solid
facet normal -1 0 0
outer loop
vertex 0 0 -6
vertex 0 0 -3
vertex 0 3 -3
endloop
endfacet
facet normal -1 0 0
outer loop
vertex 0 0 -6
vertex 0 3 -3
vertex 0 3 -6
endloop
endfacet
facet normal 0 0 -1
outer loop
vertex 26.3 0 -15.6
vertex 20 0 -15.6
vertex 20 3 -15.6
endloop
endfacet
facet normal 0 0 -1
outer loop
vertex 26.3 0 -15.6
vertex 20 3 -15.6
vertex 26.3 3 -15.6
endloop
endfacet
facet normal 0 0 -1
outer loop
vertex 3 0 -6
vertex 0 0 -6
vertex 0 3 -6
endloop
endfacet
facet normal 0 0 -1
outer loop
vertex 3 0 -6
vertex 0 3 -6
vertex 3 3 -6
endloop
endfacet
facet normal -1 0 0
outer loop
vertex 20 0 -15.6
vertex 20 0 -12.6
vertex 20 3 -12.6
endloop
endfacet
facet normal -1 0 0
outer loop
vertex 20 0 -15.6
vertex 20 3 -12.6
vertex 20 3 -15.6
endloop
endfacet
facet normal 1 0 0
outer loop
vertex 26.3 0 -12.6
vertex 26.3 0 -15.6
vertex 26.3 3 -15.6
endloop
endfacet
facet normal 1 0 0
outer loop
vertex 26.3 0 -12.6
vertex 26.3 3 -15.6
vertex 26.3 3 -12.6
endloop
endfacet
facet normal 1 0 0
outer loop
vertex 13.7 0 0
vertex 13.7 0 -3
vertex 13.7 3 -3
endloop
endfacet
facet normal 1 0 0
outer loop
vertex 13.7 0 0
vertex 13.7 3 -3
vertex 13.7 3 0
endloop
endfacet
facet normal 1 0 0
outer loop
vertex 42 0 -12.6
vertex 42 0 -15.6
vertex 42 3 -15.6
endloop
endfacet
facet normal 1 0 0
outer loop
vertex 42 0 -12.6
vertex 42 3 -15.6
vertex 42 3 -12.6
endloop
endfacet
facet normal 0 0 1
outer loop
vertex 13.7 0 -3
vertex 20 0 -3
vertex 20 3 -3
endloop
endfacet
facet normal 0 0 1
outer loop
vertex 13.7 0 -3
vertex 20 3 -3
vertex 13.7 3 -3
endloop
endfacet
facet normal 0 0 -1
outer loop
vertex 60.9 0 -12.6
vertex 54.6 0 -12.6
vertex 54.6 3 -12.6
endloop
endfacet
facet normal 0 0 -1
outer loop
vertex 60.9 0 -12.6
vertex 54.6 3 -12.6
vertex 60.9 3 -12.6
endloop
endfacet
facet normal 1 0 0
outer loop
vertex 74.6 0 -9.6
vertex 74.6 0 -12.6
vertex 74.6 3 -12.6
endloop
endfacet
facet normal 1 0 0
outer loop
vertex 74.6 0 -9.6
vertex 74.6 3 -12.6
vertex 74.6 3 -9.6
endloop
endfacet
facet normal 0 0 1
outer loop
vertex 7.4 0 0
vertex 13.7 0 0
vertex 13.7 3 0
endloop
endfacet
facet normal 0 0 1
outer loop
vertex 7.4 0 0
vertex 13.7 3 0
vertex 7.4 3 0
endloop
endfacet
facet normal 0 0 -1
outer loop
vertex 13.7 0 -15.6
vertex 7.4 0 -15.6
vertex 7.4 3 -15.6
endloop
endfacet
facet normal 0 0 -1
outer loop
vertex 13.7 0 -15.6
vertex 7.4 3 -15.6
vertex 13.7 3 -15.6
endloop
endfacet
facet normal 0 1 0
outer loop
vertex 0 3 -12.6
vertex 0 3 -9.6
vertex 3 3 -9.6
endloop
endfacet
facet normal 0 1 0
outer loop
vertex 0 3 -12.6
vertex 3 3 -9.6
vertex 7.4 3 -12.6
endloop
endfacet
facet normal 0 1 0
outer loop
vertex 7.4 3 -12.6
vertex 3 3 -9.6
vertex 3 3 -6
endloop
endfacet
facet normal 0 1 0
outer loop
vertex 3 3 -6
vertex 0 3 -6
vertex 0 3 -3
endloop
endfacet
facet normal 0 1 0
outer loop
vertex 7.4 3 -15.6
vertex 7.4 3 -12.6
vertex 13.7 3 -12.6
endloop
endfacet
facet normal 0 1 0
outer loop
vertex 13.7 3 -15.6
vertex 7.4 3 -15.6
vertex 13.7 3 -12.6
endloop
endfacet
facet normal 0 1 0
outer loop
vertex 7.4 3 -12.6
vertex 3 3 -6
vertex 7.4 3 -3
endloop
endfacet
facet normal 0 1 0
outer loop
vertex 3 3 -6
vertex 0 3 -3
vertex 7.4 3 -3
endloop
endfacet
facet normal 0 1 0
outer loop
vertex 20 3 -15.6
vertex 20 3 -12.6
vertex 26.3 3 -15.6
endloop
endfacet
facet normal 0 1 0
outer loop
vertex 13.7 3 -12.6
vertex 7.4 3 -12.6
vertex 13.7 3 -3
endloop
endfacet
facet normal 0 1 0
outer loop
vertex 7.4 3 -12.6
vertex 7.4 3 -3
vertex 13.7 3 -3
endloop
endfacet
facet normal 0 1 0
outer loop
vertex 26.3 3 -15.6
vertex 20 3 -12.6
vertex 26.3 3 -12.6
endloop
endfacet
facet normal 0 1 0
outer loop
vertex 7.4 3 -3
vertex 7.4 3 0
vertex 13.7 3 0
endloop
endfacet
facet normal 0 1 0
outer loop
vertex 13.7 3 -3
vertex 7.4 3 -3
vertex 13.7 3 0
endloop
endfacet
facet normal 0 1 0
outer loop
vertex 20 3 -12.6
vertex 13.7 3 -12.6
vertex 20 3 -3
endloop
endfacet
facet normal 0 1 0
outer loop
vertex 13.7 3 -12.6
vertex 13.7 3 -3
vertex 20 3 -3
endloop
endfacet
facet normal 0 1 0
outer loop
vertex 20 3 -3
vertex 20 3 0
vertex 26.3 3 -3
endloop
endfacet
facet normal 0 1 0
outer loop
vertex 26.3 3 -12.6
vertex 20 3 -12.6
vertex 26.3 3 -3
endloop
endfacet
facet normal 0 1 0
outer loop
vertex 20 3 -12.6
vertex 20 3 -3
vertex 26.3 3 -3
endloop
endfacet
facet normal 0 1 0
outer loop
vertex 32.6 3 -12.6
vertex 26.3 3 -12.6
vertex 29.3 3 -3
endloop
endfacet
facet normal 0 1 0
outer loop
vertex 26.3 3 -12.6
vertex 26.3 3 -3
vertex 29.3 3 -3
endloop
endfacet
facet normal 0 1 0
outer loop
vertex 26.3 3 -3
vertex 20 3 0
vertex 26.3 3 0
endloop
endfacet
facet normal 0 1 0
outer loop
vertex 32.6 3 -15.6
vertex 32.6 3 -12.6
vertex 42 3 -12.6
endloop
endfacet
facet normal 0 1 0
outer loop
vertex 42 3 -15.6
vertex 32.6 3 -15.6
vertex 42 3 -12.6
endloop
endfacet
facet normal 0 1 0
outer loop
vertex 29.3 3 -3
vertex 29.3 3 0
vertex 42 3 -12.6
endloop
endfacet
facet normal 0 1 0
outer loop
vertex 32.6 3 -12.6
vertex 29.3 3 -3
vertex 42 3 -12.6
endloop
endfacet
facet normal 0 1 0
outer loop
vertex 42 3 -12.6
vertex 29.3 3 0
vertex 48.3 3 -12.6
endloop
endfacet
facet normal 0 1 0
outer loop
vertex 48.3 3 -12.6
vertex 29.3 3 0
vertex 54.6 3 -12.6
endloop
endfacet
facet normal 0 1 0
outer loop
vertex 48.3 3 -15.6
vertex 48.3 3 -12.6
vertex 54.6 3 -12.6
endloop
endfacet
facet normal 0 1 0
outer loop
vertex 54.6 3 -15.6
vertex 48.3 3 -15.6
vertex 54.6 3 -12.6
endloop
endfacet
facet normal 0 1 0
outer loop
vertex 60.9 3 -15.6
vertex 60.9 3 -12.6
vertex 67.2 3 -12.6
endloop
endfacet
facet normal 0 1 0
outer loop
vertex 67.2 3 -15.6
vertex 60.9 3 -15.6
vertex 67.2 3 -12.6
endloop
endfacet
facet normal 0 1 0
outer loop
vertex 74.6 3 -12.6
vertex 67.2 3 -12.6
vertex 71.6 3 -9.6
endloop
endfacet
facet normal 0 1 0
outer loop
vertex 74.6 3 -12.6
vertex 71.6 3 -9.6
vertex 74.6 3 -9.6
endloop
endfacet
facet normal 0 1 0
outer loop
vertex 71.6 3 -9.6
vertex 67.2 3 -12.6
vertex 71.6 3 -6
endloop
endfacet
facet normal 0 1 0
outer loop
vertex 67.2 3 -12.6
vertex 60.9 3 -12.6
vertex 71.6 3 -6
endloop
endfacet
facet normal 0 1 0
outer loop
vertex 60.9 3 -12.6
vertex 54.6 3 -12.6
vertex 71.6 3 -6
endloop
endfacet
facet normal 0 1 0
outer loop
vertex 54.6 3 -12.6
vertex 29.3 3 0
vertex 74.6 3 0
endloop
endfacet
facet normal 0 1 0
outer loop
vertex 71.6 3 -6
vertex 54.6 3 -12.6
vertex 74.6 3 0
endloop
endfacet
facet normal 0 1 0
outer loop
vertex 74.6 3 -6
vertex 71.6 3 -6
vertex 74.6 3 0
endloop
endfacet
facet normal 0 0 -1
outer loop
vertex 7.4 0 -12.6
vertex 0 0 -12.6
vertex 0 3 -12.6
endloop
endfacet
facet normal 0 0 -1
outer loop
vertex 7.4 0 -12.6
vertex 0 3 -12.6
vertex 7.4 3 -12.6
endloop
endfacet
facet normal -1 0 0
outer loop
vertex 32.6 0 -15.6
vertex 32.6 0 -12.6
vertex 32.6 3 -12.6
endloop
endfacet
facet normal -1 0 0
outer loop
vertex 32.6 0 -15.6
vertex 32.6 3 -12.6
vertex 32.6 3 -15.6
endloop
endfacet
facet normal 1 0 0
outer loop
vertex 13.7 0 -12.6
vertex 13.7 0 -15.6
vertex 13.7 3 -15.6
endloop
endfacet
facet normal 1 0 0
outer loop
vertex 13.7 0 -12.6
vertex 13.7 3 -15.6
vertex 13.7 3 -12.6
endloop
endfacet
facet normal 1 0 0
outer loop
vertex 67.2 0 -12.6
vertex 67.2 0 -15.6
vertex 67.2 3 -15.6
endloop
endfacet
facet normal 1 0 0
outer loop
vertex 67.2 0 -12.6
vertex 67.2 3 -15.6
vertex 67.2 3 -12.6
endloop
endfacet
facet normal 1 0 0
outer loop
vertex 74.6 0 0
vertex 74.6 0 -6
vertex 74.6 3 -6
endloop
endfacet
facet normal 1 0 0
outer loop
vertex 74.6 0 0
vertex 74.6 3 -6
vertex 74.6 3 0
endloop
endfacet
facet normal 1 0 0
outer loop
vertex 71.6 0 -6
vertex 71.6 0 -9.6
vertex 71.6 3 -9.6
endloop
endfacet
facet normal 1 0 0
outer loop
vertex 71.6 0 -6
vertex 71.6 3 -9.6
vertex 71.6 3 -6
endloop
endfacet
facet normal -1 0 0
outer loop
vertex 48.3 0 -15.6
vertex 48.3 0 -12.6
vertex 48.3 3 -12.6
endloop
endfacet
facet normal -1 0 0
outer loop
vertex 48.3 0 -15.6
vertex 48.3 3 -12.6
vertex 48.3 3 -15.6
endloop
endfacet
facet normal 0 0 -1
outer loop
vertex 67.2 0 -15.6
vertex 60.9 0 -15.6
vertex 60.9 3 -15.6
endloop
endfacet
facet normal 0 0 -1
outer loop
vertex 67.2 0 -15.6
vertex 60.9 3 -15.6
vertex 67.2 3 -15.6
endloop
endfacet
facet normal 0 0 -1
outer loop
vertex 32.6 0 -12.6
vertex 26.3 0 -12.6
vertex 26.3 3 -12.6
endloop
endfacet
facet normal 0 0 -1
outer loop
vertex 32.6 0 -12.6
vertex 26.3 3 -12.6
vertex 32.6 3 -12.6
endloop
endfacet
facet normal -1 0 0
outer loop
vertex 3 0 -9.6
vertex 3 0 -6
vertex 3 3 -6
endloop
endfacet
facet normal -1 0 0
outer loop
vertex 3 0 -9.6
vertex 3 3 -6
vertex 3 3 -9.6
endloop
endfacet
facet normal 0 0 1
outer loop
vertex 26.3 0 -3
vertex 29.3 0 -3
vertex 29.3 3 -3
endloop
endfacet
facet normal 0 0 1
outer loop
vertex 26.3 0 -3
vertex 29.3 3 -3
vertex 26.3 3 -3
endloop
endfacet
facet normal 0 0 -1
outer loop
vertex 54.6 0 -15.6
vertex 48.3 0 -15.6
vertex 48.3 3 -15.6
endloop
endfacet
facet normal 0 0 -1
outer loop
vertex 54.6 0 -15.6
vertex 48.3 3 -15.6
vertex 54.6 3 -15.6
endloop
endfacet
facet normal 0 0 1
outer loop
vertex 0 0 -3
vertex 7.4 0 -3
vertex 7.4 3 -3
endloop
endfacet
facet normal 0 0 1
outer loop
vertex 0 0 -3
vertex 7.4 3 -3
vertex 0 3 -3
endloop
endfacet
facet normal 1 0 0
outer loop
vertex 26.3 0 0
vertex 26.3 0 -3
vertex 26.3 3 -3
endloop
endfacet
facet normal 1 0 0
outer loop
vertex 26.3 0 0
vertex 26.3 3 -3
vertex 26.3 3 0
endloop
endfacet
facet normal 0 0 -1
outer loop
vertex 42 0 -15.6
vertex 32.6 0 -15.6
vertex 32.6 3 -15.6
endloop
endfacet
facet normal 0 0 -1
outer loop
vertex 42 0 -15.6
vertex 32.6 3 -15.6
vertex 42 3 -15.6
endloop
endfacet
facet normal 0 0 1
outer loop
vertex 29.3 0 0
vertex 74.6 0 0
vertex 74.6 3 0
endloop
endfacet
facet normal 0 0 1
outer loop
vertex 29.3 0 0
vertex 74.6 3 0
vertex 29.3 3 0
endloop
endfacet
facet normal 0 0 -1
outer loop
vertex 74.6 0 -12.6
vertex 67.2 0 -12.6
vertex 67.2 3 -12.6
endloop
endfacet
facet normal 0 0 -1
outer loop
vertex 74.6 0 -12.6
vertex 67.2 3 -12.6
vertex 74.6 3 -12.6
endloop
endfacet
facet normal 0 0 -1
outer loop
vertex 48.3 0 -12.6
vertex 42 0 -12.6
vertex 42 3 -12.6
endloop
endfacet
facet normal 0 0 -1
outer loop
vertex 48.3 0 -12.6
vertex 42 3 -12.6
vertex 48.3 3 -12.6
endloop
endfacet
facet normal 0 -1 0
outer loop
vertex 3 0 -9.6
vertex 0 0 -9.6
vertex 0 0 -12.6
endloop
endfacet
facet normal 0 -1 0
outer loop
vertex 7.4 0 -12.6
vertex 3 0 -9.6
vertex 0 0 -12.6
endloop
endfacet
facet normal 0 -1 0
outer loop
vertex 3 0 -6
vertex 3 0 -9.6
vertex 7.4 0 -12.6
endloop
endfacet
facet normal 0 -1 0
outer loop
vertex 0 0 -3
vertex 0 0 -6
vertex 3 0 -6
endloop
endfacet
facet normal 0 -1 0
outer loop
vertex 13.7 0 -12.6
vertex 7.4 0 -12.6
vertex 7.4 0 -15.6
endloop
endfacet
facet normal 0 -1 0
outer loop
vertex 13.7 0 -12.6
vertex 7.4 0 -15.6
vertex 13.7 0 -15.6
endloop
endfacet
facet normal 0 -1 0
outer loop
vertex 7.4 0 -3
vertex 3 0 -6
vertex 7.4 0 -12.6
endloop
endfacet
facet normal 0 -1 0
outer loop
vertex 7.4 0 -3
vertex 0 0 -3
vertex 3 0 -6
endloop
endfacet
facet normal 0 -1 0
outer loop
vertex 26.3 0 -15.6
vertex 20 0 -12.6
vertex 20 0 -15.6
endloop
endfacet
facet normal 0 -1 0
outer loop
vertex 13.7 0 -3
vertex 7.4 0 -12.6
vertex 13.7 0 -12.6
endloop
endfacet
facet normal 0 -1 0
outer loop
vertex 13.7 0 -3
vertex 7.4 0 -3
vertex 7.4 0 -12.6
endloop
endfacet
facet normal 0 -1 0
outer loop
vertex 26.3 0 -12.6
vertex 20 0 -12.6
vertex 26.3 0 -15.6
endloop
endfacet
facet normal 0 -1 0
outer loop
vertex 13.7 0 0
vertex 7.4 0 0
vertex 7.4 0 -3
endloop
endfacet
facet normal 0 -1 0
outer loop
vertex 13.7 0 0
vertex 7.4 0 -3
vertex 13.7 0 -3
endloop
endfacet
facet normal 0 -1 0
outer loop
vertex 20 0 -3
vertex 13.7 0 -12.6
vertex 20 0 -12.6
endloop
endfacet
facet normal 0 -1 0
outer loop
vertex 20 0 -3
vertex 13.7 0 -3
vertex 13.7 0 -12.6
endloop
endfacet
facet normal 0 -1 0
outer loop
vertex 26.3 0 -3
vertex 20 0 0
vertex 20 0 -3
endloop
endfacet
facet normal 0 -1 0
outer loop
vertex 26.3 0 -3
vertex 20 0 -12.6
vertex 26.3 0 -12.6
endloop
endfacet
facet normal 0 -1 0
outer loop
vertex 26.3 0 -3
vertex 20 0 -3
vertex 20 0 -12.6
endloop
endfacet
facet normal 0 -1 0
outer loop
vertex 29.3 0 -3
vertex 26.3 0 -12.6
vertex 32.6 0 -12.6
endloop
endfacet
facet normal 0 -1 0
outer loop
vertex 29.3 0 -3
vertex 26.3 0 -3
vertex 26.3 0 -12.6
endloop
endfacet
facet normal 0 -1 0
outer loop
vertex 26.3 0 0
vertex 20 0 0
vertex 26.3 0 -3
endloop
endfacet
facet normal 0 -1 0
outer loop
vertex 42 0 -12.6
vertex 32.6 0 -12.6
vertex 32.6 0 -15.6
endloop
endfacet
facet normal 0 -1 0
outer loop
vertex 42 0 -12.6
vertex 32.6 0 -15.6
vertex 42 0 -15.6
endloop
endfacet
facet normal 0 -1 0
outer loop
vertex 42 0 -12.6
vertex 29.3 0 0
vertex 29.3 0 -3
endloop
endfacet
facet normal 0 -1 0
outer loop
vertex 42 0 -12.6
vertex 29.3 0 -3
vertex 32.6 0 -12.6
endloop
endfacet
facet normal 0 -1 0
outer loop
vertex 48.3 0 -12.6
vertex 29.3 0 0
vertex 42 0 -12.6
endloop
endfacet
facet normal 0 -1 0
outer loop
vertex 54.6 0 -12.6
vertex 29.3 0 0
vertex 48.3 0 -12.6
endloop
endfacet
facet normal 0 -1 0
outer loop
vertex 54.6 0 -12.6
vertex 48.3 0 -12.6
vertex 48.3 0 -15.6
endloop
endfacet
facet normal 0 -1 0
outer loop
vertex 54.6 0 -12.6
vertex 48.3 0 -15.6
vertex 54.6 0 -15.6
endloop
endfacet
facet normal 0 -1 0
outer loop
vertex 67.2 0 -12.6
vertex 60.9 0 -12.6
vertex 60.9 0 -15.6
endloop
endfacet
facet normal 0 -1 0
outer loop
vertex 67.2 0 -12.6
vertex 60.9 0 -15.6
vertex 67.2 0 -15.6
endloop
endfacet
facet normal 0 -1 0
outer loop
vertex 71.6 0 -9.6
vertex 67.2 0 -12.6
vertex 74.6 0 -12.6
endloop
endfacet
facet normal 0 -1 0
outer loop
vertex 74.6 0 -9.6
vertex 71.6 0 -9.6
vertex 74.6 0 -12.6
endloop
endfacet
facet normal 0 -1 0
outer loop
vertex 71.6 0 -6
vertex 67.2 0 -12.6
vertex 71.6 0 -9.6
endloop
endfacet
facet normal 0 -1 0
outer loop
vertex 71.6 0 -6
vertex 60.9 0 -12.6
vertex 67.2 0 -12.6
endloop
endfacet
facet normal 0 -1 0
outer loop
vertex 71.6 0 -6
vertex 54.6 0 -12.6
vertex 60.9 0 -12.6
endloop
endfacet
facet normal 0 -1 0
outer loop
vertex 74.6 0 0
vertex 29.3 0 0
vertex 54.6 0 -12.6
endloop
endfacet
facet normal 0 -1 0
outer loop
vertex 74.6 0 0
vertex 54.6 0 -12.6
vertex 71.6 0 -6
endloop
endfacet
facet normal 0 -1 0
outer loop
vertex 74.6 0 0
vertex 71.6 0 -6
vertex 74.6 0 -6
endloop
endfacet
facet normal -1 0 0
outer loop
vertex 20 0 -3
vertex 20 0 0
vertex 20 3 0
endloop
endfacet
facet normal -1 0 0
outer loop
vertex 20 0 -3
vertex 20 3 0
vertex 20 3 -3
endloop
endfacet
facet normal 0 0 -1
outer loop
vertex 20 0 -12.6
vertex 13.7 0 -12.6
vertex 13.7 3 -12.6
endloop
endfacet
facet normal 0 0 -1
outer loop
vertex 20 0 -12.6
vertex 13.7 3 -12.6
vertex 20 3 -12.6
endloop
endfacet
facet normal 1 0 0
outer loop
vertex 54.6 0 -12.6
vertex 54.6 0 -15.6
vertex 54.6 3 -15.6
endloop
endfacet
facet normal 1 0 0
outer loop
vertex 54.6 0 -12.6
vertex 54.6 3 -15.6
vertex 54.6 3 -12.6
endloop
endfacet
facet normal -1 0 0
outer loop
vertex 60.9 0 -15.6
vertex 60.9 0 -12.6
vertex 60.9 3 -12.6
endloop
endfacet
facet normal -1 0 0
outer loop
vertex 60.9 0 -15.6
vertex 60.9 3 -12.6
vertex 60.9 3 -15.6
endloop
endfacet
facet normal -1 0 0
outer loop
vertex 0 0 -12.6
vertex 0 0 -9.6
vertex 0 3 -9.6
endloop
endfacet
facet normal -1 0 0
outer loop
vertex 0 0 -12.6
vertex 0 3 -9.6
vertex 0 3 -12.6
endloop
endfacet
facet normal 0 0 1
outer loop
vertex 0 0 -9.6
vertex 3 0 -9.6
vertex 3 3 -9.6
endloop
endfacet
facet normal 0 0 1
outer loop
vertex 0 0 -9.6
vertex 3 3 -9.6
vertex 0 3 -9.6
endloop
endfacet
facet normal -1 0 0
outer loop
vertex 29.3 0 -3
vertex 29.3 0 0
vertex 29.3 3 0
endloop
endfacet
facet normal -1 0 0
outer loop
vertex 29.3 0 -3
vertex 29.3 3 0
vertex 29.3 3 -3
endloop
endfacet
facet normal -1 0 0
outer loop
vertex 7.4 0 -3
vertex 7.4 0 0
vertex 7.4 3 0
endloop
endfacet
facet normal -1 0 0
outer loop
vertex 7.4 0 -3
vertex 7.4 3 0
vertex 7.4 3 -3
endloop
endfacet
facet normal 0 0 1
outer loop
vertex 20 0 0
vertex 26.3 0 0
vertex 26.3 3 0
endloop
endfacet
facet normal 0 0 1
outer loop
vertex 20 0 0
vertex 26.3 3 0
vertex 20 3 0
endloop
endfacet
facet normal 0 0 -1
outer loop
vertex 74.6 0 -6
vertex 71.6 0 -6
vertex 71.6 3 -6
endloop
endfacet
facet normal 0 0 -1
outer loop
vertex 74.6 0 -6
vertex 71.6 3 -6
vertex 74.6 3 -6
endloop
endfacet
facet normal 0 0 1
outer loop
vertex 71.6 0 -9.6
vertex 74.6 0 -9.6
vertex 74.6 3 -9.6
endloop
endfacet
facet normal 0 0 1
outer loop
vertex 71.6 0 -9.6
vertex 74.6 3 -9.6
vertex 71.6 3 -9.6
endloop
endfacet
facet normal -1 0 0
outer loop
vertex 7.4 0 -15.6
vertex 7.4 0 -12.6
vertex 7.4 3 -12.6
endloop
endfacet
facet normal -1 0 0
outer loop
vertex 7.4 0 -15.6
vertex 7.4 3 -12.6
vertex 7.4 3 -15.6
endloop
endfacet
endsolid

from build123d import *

# Parameters (mm, degrees)
F1_DEPTH = 3


with BuildPart() as f1:
    # F0 (on Front) → F1 (new body)
    with BuildSketch(Plane.XZ):
        Polygon((7.4, -3), (0, -3), (0, -6), (3, -6), (3, -9.6), (0, -9.6), (0, -12.6), (7.4, -12.6), (7.4, -15.6), (13.7, -15.6), (13.7, -12.6), (20, -12.6), (20, -15.6), (26.3, -15.6), (26.3, -12.6), (32.6, -12.6), (32.6, -15.6), (42, -15.6), (42, -12.6), (48.3, -12.6), (48.3, -15.6), (54.6, -15.6), (54.6, -12.6), (60.9, -12.6), (60.9, -15.6), (67.2, -15.6), (67.2, -12.6), (74.6, -12.6), (74.6, -9.6), (71.6, -9.6), (71.6, -6), (74.6, -6), (74.6, 0), (29.3, 0), (29.3, -3), (26.3, -3), (26.3, 0), (20, 0), (20, -3), (13.7, -3), (13.7, 0), (7.4, 0), align=None)
    extrude(amount=-F1_DEPTH)


solid = f1.part
